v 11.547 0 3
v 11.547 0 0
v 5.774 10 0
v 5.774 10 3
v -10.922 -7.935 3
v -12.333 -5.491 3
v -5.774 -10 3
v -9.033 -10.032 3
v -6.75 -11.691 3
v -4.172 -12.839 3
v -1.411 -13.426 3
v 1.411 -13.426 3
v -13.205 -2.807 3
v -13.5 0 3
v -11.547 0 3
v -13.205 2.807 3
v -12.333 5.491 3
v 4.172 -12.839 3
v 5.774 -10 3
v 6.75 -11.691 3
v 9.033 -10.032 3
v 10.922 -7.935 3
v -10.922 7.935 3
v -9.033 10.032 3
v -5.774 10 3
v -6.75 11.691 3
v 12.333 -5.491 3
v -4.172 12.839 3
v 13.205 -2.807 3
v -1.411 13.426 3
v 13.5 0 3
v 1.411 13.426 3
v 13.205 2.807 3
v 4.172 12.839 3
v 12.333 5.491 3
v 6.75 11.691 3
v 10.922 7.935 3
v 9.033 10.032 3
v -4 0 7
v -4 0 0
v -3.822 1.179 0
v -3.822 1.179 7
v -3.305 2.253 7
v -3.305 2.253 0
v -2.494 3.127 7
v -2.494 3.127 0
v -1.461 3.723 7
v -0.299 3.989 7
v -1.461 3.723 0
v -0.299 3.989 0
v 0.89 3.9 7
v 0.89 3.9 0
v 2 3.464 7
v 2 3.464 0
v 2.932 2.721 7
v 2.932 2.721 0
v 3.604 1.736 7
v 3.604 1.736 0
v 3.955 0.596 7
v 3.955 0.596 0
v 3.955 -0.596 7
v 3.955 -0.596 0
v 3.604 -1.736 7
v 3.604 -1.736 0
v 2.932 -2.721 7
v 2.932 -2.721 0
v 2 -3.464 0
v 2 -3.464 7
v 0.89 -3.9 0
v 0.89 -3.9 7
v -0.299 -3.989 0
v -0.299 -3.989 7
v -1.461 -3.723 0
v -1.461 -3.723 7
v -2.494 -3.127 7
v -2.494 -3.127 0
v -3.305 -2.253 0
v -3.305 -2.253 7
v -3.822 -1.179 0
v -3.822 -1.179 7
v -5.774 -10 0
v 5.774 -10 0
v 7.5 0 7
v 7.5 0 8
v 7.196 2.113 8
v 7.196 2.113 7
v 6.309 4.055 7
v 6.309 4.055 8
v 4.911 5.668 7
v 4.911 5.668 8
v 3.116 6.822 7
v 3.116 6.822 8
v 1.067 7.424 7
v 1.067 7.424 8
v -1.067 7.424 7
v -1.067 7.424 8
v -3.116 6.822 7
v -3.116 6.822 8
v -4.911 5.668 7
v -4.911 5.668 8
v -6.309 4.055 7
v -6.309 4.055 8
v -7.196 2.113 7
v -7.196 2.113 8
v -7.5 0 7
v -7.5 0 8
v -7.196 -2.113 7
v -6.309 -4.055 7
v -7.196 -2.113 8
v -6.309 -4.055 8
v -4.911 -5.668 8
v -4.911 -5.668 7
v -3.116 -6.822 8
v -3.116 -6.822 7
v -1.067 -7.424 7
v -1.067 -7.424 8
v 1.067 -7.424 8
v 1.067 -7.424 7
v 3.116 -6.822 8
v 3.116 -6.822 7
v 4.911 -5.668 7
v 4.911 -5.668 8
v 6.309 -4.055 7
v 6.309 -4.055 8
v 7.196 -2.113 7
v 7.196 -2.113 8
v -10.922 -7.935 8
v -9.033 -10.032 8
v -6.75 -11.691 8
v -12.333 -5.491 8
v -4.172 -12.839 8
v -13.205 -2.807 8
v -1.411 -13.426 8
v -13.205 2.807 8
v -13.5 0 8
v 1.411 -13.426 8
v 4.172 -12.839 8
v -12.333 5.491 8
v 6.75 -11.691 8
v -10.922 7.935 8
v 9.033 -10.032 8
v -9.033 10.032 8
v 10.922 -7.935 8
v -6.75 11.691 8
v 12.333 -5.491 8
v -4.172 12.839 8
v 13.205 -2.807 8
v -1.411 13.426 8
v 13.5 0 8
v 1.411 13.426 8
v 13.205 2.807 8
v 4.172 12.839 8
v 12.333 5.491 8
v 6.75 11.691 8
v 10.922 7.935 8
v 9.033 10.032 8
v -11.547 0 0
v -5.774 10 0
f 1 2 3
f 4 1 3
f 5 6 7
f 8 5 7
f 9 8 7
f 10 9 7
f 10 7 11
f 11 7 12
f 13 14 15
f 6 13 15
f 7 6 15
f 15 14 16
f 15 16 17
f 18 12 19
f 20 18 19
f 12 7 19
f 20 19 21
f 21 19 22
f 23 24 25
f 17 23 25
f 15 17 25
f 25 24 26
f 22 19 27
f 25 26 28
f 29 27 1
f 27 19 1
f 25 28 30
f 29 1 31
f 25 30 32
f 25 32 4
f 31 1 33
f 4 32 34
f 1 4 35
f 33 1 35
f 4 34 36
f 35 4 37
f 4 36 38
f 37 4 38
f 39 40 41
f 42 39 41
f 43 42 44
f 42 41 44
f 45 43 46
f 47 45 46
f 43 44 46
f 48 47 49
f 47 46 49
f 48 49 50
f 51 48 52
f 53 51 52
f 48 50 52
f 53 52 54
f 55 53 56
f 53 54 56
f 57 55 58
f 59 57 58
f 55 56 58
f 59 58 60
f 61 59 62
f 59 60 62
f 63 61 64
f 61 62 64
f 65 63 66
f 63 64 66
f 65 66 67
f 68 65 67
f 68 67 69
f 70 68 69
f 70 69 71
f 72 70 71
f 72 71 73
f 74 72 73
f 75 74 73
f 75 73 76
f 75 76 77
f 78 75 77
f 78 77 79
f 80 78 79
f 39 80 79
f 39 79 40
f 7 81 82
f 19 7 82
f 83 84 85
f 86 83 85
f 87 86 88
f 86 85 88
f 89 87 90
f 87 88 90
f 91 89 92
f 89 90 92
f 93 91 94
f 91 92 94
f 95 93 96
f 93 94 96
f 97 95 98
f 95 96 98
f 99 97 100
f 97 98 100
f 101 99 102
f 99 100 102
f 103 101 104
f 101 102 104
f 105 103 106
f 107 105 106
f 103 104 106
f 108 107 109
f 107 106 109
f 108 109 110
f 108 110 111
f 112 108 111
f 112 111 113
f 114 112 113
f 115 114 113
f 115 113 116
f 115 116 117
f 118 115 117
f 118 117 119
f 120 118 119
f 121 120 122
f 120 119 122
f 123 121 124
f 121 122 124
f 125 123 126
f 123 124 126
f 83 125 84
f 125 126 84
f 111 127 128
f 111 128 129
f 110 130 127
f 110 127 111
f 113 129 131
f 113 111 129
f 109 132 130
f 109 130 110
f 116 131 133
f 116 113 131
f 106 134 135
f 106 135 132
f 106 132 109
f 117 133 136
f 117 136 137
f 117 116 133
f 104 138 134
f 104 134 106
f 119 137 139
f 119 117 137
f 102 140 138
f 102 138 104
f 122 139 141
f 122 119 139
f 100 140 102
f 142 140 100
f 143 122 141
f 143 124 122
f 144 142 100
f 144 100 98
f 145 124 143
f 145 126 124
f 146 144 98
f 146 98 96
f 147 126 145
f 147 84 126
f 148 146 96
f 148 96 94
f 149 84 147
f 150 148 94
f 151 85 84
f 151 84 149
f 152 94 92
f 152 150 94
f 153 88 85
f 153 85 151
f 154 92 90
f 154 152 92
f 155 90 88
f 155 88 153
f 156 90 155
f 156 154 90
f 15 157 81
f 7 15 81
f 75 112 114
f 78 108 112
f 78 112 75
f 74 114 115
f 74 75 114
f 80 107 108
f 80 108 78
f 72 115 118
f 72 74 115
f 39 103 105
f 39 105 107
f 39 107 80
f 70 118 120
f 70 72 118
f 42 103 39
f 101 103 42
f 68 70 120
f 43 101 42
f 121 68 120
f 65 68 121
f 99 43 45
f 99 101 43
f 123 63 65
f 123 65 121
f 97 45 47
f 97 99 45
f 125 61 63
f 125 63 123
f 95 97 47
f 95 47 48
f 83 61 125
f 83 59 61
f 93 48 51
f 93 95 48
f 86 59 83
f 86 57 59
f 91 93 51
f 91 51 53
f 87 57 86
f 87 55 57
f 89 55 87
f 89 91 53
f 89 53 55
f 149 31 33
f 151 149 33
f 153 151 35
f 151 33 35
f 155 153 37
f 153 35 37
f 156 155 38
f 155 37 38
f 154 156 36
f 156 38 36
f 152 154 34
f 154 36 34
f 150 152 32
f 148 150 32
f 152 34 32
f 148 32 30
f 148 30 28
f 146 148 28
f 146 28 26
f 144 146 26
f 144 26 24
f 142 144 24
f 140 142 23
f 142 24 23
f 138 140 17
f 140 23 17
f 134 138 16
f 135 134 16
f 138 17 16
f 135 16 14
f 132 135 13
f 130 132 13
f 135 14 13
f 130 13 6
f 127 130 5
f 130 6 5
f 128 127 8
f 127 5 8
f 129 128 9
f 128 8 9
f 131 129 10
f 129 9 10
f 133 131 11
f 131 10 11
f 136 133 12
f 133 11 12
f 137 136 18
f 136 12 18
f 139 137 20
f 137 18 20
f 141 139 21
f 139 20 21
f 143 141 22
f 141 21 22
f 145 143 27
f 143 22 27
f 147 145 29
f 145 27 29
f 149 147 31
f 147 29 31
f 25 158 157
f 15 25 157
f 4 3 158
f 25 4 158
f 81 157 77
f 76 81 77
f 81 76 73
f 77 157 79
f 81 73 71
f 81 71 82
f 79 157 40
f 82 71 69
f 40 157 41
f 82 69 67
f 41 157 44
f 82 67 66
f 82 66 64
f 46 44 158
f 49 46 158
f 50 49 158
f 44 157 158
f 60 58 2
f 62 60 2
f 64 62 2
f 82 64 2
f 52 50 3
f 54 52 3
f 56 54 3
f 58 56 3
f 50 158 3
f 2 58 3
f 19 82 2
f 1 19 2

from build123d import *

# Parameters (mm, degrees)
BOSS_EXTRUDE1_DEPTH = 3
SKETCH2_R           = 13.5
BOSS_EXTRUDE2_DEPTH = 5
SKETCH3_R           = 7.5
CUT_EXTRUDE1_DEPTH  = 1
SKETCH4_R           = 4
CUT_EXTRUDE2_DEPTH  = 9


with BuildPart() as part:
    # Sketch1 → Boss-Extrude1 (new body)
    with BuildSketch(Plane.XY):
        Polygon((5.773502692, -10), (11.547005384, 0), (5.773502692, 10), (-5.773502692, 10), (-11.547005384, 0), (-5.773502692, -10), align=None)
    extrude(amount=BOSS_EXTRUDE1_DEPTH)

    # Sketch2 → Boss-Extrude2 (add)
    with BuildSketch(Plane.XY.offset(3)):
        Circle(SKETCH2_R)
    extrude(amount=BOSS_EXTRUDE2_DEPTH)

    # Sketch3 → Cut-Extrude1 (cut)
    with BuildSketch(Plane.XY.offset(8)):
        Circle(SKETCH3_R)
    extrude(amount=-CUT_EXTRUDE1_DEPTH, mode=Mode.SUBTRACT)

    # Sketch4 → Cut-Extrude2 (cut, through all)
    with BuildSketch(Plane(origin=(0, 0, 0), x_dir=(-1, 0, 0), z_dir=(0, 0, -1))):
        Circle(SKETCH4_R)
    extrude(amount=-CUT_EXTRUDE2_DEPTH, mode=Mode.SUBTRACT)


solid = part.part
